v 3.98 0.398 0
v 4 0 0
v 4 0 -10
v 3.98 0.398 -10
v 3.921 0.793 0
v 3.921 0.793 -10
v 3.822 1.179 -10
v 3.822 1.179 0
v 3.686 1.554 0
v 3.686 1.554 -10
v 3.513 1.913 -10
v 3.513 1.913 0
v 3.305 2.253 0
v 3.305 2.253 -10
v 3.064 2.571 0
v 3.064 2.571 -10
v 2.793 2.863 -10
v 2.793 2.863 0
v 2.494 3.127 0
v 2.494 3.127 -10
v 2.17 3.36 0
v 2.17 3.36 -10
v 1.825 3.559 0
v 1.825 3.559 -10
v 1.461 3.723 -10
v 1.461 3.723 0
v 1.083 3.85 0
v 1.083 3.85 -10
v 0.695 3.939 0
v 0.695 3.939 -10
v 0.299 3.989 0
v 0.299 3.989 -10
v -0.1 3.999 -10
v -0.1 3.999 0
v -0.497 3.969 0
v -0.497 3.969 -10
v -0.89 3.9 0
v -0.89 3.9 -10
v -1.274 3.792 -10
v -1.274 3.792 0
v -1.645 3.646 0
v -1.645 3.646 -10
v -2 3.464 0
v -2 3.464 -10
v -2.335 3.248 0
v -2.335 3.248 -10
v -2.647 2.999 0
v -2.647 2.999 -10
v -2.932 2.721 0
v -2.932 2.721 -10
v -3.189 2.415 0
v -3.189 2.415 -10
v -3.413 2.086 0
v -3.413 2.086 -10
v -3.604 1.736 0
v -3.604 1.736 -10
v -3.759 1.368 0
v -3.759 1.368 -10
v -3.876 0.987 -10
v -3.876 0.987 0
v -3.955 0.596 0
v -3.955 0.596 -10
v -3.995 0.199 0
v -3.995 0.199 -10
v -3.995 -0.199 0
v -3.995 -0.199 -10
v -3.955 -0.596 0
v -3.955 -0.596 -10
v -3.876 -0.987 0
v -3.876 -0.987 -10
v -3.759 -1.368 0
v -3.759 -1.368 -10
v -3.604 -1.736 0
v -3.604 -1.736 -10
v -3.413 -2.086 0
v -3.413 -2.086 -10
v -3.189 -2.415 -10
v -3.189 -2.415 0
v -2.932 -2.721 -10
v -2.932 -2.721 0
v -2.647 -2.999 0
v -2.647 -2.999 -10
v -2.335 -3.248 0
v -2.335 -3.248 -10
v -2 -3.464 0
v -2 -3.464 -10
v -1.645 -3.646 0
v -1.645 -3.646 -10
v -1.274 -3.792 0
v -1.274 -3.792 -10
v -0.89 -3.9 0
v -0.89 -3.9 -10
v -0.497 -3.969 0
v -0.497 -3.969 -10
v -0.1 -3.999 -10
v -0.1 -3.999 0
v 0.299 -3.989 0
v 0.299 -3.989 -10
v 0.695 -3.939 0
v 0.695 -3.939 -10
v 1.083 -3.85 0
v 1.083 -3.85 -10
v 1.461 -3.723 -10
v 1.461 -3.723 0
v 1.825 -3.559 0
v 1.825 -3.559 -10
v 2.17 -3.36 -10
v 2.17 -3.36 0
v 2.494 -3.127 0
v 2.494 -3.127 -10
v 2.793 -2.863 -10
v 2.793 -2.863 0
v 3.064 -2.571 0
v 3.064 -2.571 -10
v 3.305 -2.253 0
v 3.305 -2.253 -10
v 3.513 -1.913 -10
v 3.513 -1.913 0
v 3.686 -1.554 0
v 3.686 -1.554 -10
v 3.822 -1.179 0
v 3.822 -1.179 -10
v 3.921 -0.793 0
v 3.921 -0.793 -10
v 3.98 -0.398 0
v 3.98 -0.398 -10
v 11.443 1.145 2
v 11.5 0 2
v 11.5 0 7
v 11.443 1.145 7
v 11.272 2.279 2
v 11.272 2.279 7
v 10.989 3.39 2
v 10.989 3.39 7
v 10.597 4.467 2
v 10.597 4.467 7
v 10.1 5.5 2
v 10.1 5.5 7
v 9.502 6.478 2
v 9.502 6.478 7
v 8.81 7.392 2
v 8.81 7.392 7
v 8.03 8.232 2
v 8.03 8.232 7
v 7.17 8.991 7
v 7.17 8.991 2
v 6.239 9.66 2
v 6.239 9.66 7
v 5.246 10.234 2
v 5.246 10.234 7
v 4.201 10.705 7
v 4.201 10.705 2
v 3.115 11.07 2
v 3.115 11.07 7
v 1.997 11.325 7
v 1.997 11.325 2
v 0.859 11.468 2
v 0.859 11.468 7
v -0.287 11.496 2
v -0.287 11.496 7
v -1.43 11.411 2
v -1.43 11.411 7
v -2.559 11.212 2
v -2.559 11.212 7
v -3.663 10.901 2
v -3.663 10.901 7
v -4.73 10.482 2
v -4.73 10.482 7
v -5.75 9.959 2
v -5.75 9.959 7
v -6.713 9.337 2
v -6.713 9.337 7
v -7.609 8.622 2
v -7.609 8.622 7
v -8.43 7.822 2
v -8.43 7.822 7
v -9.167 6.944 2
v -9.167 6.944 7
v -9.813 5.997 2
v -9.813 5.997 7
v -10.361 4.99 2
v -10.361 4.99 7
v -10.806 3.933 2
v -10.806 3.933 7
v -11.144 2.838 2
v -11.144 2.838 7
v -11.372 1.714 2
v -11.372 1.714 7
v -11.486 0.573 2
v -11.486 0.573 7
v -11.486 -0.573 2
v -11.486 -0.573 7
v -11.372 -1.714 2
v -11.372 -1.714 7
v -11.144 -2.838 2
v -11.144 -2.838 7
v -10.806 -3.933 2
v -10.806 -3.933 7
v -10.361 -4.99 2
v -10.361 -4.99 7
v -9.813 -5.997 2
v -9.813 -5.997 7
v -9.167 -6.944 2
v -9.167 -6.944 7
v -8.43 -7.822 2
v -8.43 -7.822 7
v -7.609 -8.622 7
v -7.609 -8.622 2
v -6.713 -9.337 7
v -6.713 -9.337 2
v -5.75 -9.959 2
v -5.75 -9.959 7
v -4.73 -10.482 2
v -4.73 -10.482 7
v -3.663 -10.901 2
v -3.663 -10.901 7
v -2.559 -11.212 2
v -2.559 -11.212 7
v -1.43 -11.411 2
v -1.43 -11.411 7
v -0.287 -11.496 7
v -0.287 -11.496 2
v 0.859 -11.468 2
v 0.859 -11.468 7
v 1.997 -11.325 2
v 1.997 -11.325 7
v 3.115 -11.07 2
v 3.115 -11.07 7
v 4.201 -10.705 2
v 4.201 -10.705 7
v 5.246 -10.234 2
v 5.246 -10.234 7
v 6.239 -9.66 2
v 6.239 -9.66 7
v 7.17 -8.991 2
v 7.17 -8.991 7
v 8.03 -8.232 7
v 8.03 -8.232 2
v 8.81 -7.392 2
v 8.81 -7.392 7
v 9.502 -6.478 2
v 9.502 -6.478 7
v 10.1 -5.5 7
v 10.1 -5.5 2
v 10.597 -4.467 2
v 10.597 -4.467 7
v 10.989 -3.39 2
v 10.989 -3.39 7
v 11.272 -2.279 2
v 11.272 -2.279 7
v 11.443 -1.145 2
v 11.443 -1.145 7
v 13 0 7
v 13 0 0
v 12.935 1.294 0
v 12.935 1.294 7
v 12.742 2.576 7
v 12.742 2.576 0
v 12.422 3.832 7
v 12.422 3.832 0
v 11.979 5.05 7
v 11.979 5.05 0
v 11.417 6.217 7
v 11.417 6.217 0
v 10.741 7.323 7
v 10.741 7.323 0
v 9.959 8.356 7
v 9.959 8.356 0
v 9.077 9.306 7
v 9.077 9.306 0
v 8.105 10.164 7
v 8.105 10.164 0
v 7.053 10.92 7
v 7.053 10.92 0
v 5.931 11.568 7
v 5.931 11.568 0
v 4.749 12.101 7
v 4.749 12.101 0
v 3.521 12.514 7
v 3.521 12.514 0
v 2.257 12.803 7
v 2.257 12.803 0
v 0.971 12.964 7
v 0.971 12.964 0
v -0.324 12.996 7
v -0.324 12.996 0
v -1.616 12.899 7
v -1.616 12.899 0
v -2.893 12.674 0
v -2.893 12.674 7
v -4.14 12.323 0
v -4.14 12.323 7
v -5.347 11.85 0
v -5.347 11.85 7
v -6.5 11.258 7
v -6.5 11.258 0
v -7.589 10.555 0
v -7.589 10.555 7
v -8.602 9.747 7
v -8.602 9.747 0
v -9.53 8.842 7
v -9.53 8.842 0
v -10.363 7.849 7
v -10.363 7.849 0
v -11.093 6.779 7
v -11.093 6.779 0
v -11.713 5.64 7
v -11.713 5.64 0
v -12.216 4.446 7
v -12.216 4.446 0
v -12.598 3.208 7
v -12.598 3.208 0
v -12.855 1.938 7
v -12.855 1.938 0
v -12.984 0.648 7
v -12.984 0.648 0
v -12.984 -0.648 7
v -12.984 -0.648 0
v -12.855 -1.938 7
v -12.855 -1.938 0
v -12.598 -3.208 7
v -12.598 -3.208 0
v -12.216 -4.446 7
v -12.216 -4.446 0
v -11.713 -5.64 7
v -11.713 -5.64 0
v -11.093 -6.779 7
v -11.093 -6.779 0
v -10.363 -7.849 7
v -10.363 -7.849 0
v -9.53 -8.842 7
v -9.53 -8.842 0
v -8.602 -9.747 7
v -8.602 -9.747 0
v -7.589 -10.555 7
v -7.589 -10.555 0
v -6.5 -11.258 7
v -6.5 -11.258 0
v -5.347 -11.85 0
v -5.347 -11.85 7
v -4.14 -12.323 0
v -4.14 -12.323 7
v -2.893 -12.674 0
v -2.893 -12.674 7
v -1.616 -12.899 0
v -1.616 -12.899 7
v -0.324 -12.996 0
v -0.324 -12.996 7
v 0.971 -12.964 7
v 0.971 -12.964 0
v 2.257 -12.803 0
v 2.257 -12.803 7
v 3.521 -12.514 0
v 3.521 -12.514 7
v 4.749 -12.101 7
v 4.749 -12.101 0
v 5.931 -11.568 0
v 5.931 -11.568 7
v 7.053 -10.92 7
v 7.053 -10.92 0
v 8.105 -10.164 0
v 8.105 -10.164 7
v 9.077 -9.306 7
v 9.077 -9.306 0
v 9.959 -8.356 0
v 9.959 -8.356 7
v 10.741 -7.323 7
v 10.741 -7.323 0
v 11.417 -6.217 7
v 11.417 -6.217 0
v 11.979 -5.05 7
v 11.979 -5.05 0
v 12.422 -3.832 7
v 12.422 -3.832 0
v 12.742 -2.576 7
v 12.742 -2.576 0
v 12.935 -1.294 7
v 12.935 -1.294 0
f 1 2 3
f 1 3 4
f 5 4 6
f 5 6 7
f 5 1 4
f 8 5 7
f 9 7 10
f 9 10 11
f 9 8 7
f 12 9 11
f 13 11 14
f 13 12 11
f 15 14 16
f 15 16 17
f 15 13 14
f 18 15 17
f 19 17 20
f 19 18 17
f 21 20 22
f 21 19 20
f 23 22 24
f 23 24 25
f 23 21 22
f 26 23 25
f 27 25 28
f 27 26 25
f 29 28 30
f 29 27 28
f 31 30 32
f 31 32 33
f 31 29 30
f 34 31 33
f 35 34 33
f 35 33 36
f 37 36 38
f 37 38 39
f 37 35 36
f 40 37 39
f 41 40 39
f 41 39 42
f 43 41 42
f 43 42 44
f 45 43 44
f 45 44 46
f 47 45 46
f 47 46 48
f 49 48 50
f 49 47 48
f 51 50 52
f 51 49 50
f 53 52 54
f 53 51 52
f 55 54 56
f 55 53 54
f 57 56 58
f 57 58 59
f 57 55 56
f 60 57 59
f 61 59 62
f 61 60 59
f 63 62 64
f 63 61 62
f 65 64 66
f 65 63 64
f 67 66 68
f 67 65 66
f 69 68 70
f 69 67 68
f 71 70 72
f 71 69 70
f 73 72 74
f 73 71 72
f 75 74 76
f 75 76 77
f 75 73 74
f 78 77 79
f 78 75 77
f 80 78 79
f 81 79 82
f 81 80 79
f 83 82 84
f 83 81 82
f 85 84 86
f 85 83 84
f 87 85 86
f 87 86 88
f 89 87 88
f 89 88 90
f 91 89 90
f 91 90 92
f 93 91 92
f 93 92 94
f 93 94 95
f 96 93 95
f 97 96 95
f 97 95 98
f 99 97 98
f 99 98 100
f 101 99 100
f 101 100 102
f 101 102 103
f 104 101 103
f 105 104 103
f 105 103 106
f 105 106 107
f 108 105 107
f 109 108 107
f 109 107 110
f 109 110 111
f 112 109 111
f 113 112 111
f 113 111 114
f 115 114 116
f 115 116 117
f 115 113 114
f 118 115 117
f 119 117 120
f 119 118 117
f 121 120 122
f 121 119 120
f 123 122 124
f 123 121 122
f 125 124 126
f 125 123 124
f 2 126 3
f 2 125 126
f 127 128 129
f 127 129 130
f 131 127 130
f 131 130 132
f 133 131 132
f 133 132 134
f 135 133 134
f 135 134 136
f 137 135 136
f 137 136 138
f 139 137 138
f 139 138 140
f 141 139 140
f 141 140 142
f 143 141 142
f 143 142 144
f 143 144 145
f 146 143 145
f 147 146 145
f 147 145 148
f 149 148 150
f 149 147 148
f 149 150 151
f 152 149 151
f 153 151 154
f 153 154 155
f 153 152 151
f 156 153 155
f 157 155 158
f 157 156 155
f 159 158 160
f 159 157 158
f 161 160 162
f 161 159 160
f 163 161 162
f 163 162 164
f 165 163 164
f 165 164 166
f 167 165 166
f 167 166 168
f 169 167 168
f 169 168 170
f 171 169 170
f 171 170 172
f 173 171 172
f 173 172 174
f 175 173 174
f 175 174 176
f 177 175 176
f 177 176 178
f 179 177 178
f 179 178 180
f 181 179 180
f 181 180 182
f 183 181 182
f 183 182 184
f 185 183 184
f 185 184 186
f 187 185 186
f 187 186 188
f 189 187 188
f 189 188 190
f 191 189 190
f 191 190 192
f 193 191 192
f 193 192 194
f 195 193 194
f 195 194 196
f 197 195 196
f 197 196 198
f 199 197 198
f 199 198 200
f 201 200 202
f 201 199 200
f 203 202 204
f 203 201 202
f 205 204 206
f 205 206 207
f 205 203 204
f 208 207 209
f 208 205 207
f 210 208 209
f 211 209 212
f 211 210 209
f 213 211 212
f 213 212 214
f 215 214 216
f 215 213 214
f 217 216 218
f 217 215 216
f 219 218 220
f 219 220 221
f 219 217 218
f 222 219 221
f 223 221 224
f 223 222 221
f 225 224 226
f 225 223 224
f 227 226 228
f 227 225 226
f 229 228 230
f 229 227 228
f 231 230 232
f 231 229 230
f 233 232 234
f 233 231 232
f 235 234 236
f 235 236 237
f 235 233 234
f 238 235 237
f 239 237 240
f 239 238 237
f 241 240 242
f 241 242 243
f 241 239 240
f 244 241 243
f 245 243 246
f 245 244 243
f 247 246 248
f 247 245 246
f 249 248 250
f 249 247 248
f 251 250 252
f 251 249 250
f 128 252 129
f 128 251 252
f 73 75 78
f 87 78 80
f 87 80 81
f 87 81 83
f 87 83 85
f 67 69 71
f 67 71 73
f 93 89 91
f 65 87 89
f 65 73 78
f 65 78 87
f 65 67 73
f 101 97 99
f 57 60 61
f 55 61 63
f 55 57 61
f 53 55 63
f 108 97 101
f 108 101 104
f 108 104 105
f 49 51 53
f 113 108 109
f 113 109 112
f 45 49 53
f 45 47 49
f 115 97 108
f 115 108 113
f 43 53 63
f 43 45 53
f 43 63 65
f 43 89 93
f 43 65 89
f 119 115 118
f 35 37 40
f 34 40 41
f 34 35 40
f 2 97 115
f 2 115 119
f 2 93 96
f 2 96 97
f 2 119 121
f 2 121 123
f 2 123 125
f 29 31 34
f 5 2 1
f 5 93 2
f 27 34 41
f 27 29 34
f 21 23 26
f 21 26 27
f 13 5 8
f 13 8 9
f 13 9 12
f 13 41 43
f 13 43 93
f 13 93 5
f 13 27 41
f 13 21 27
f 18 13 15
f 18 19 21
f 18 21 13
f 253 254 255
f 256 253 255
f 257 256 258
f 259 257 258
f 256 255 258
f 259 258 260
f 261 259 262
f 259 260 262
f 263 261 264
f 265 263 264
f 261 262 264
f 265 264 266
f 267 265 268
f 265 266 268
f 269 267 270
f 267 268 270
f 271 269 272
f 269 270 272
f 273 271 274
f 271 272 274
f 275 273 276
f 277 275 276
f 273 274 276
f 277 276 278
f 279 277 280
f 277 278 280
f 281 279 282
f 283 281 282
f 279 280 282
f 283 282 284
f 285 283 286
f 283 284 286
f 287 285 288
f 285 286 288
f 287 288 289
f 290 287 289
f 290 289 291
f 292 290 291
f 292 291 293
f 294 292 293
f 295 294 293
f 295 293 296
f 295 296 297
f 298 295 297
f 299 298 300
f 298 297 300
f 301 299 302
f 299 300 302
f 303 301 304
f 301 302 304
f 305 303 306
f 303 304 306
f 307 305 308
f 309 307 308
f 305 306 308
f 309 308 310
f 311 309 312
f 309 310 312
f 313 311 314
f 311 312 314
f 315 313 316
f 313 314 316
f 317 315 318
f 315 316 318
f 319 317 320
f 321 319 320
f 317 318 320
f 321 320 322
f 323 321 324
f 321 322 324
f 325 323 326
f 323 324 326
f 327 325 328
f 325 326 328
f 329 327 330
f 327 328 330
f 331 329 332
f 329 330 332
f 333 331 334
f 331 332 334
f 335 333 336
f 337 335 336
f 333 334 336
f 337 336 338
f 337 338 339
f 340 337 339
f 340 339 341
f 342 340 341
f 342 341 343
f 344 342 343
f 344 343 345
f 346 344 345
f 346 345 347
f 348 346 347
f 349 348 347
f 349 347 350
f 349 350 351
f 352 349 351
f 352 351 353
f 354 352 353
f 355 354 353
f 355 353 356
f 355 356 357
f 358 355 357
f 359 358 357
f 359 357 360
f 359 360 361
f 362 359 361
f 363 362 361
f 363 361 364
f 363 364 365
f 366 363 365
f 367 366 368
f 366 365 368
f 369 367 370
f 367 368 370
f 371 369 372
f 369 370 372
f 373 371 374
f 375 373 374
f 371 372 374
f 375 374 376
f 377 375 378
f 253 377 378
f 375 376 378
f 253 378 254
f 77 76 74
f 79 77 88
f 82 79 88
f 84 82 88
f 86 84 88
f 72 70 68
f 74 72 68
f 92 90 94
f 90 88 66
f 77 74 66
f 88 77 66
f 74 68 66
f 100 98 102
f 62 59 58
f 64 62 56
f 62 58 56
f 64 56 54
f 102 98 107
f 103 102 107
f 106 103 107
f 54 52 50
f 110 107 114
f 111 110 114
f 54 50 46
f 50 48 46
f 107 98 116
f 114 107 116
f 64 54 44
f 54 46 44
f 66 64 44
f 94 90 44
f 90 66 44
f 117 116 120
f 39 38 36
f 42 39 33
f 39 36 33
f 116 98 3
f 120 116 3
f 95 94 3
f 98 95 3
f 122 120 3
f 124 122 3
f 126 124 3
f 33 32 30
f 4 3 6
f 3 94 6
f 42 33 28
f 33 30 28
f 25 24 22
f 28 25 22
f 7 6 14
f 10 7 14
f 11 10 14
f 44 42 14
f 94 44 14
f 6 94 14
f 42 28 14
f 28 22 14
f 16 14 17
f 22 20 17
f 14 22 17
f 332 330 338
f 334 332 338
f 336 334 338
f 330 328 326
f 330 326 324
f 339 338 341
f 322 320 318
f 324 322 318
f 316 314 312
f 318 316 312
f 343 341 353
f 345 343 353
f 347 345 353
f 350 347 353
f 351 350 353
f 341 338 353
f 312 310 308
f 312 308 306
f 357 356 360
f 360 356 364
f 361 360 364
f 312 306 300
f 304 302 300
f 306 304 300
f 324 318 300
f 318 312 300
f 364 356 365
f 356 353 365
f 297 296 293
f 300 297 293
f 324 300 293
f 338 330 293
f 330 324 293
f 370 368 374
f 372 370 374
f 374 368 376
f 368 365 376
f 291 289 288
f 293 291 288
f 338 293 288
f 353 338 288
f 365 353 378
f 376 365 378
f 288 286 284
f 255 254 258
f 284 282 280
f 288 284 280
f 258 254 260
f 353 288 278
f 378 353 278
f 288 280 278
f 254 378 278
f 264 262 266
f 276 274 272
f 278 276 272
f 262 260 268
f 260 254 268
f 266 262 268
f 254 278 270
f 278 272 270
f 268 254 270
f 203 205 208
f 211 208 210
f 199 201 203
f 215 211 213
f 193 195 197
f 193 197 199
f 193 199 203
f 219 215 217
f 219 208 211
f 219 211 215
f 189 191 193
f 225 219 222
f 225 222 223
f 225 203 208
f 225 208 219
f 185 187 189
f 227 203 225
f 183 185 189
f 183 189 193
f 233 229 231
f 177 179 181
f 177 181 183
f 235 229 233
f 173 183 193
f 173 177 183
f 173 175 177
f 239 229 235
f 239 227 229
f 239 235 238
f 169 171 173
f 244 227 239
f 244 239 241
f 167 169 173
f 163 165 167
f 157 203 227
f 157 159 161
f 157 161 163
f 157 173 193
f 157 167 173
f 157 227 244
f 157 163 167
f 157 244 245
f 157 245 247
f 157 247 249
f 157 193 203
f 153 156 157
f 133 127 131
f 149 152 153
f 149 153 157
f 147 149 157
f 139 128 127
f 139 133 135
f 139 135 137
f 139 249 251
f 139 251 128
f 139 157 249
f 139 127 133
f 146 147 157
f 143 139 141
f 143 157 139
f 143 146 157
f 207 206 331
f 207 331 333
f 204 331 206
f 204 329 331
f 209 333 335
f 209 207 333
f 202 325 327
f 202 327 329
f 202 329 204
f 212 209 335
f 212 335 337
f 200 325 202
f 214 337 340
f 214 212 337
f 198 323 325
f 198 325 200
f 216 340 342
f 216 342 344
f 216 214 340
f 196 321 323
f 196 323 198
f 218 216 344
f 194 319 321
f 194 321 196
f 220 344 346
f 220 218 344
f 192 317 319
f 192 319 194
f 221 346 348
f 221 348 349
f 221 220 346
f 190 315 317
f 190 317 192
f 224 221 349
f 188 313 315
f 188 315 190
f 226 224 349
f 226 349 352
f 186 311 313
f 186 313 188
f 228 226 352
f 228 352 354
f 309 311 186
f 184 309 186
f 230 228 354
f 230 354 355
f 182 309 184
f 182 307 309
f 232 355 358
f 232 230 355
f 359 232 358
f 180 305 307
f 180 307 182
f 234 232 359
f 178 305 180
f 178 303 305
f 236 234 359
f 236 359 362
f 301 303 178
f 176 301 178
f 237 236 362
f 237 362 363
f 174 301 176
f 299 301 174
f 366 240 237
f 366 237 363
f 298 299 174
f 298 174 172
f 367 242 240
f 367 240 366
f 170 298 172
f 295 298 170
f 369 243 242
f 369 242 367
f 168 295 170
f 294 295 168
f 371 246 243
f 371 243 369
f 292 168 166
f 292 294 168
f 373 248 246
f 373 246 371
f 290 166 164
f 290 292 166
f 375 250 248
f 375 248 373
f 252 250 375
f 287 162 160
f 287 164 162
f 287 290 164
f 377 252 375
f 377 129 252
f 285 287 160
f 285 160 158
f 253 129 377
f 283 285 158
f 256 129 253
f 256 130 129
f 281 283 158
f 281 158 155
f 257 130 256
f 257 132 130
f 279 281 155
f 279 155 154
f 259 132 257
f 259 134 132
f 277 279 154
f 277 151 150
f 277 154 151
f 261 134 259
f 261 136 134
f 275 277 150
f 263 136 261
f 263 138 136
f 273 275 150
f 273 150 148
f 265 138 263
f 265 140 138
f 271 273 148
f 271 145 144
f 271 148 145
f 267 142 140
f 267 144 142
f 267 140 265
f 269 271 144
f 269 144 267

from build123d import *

# Parameters (mm, degrees)
F0_R     = 4
F1_DEPTH = 10
F2_R     = 11.5
F2_R_2   = 4
F3_DEPTH = 2
F2_R_3   = 13
F4_DEPTH = 7


with BuildPart() as f1:
    # F0 (on Top) → F1 (new body)
    with BuildSketch(Plane.XY):
        Circle(F0_R)
    extrude(amount=-F1_DEPTH)


with BuildPart() as f3:
    # F2 (on face) → F3 (new body)
    with BuildSketch(Plane.XY):
        Circle(F2_R)
        Circle(F2_R_2, mode=Mode.SUBTRACT)
        Circle(F2_R_2)
    extrude(amount=F3_DEPTH)

    # F2 (on face) → F4 (join)
    with BuildSketch(Plane.XY):
        Circle(F2_R_3)
        Circle(F2_R, mode=Mode.SUBTRACT)
    extrude(amount=F4_DEPTH)


solid = Compound([f1.part, f3.part])
